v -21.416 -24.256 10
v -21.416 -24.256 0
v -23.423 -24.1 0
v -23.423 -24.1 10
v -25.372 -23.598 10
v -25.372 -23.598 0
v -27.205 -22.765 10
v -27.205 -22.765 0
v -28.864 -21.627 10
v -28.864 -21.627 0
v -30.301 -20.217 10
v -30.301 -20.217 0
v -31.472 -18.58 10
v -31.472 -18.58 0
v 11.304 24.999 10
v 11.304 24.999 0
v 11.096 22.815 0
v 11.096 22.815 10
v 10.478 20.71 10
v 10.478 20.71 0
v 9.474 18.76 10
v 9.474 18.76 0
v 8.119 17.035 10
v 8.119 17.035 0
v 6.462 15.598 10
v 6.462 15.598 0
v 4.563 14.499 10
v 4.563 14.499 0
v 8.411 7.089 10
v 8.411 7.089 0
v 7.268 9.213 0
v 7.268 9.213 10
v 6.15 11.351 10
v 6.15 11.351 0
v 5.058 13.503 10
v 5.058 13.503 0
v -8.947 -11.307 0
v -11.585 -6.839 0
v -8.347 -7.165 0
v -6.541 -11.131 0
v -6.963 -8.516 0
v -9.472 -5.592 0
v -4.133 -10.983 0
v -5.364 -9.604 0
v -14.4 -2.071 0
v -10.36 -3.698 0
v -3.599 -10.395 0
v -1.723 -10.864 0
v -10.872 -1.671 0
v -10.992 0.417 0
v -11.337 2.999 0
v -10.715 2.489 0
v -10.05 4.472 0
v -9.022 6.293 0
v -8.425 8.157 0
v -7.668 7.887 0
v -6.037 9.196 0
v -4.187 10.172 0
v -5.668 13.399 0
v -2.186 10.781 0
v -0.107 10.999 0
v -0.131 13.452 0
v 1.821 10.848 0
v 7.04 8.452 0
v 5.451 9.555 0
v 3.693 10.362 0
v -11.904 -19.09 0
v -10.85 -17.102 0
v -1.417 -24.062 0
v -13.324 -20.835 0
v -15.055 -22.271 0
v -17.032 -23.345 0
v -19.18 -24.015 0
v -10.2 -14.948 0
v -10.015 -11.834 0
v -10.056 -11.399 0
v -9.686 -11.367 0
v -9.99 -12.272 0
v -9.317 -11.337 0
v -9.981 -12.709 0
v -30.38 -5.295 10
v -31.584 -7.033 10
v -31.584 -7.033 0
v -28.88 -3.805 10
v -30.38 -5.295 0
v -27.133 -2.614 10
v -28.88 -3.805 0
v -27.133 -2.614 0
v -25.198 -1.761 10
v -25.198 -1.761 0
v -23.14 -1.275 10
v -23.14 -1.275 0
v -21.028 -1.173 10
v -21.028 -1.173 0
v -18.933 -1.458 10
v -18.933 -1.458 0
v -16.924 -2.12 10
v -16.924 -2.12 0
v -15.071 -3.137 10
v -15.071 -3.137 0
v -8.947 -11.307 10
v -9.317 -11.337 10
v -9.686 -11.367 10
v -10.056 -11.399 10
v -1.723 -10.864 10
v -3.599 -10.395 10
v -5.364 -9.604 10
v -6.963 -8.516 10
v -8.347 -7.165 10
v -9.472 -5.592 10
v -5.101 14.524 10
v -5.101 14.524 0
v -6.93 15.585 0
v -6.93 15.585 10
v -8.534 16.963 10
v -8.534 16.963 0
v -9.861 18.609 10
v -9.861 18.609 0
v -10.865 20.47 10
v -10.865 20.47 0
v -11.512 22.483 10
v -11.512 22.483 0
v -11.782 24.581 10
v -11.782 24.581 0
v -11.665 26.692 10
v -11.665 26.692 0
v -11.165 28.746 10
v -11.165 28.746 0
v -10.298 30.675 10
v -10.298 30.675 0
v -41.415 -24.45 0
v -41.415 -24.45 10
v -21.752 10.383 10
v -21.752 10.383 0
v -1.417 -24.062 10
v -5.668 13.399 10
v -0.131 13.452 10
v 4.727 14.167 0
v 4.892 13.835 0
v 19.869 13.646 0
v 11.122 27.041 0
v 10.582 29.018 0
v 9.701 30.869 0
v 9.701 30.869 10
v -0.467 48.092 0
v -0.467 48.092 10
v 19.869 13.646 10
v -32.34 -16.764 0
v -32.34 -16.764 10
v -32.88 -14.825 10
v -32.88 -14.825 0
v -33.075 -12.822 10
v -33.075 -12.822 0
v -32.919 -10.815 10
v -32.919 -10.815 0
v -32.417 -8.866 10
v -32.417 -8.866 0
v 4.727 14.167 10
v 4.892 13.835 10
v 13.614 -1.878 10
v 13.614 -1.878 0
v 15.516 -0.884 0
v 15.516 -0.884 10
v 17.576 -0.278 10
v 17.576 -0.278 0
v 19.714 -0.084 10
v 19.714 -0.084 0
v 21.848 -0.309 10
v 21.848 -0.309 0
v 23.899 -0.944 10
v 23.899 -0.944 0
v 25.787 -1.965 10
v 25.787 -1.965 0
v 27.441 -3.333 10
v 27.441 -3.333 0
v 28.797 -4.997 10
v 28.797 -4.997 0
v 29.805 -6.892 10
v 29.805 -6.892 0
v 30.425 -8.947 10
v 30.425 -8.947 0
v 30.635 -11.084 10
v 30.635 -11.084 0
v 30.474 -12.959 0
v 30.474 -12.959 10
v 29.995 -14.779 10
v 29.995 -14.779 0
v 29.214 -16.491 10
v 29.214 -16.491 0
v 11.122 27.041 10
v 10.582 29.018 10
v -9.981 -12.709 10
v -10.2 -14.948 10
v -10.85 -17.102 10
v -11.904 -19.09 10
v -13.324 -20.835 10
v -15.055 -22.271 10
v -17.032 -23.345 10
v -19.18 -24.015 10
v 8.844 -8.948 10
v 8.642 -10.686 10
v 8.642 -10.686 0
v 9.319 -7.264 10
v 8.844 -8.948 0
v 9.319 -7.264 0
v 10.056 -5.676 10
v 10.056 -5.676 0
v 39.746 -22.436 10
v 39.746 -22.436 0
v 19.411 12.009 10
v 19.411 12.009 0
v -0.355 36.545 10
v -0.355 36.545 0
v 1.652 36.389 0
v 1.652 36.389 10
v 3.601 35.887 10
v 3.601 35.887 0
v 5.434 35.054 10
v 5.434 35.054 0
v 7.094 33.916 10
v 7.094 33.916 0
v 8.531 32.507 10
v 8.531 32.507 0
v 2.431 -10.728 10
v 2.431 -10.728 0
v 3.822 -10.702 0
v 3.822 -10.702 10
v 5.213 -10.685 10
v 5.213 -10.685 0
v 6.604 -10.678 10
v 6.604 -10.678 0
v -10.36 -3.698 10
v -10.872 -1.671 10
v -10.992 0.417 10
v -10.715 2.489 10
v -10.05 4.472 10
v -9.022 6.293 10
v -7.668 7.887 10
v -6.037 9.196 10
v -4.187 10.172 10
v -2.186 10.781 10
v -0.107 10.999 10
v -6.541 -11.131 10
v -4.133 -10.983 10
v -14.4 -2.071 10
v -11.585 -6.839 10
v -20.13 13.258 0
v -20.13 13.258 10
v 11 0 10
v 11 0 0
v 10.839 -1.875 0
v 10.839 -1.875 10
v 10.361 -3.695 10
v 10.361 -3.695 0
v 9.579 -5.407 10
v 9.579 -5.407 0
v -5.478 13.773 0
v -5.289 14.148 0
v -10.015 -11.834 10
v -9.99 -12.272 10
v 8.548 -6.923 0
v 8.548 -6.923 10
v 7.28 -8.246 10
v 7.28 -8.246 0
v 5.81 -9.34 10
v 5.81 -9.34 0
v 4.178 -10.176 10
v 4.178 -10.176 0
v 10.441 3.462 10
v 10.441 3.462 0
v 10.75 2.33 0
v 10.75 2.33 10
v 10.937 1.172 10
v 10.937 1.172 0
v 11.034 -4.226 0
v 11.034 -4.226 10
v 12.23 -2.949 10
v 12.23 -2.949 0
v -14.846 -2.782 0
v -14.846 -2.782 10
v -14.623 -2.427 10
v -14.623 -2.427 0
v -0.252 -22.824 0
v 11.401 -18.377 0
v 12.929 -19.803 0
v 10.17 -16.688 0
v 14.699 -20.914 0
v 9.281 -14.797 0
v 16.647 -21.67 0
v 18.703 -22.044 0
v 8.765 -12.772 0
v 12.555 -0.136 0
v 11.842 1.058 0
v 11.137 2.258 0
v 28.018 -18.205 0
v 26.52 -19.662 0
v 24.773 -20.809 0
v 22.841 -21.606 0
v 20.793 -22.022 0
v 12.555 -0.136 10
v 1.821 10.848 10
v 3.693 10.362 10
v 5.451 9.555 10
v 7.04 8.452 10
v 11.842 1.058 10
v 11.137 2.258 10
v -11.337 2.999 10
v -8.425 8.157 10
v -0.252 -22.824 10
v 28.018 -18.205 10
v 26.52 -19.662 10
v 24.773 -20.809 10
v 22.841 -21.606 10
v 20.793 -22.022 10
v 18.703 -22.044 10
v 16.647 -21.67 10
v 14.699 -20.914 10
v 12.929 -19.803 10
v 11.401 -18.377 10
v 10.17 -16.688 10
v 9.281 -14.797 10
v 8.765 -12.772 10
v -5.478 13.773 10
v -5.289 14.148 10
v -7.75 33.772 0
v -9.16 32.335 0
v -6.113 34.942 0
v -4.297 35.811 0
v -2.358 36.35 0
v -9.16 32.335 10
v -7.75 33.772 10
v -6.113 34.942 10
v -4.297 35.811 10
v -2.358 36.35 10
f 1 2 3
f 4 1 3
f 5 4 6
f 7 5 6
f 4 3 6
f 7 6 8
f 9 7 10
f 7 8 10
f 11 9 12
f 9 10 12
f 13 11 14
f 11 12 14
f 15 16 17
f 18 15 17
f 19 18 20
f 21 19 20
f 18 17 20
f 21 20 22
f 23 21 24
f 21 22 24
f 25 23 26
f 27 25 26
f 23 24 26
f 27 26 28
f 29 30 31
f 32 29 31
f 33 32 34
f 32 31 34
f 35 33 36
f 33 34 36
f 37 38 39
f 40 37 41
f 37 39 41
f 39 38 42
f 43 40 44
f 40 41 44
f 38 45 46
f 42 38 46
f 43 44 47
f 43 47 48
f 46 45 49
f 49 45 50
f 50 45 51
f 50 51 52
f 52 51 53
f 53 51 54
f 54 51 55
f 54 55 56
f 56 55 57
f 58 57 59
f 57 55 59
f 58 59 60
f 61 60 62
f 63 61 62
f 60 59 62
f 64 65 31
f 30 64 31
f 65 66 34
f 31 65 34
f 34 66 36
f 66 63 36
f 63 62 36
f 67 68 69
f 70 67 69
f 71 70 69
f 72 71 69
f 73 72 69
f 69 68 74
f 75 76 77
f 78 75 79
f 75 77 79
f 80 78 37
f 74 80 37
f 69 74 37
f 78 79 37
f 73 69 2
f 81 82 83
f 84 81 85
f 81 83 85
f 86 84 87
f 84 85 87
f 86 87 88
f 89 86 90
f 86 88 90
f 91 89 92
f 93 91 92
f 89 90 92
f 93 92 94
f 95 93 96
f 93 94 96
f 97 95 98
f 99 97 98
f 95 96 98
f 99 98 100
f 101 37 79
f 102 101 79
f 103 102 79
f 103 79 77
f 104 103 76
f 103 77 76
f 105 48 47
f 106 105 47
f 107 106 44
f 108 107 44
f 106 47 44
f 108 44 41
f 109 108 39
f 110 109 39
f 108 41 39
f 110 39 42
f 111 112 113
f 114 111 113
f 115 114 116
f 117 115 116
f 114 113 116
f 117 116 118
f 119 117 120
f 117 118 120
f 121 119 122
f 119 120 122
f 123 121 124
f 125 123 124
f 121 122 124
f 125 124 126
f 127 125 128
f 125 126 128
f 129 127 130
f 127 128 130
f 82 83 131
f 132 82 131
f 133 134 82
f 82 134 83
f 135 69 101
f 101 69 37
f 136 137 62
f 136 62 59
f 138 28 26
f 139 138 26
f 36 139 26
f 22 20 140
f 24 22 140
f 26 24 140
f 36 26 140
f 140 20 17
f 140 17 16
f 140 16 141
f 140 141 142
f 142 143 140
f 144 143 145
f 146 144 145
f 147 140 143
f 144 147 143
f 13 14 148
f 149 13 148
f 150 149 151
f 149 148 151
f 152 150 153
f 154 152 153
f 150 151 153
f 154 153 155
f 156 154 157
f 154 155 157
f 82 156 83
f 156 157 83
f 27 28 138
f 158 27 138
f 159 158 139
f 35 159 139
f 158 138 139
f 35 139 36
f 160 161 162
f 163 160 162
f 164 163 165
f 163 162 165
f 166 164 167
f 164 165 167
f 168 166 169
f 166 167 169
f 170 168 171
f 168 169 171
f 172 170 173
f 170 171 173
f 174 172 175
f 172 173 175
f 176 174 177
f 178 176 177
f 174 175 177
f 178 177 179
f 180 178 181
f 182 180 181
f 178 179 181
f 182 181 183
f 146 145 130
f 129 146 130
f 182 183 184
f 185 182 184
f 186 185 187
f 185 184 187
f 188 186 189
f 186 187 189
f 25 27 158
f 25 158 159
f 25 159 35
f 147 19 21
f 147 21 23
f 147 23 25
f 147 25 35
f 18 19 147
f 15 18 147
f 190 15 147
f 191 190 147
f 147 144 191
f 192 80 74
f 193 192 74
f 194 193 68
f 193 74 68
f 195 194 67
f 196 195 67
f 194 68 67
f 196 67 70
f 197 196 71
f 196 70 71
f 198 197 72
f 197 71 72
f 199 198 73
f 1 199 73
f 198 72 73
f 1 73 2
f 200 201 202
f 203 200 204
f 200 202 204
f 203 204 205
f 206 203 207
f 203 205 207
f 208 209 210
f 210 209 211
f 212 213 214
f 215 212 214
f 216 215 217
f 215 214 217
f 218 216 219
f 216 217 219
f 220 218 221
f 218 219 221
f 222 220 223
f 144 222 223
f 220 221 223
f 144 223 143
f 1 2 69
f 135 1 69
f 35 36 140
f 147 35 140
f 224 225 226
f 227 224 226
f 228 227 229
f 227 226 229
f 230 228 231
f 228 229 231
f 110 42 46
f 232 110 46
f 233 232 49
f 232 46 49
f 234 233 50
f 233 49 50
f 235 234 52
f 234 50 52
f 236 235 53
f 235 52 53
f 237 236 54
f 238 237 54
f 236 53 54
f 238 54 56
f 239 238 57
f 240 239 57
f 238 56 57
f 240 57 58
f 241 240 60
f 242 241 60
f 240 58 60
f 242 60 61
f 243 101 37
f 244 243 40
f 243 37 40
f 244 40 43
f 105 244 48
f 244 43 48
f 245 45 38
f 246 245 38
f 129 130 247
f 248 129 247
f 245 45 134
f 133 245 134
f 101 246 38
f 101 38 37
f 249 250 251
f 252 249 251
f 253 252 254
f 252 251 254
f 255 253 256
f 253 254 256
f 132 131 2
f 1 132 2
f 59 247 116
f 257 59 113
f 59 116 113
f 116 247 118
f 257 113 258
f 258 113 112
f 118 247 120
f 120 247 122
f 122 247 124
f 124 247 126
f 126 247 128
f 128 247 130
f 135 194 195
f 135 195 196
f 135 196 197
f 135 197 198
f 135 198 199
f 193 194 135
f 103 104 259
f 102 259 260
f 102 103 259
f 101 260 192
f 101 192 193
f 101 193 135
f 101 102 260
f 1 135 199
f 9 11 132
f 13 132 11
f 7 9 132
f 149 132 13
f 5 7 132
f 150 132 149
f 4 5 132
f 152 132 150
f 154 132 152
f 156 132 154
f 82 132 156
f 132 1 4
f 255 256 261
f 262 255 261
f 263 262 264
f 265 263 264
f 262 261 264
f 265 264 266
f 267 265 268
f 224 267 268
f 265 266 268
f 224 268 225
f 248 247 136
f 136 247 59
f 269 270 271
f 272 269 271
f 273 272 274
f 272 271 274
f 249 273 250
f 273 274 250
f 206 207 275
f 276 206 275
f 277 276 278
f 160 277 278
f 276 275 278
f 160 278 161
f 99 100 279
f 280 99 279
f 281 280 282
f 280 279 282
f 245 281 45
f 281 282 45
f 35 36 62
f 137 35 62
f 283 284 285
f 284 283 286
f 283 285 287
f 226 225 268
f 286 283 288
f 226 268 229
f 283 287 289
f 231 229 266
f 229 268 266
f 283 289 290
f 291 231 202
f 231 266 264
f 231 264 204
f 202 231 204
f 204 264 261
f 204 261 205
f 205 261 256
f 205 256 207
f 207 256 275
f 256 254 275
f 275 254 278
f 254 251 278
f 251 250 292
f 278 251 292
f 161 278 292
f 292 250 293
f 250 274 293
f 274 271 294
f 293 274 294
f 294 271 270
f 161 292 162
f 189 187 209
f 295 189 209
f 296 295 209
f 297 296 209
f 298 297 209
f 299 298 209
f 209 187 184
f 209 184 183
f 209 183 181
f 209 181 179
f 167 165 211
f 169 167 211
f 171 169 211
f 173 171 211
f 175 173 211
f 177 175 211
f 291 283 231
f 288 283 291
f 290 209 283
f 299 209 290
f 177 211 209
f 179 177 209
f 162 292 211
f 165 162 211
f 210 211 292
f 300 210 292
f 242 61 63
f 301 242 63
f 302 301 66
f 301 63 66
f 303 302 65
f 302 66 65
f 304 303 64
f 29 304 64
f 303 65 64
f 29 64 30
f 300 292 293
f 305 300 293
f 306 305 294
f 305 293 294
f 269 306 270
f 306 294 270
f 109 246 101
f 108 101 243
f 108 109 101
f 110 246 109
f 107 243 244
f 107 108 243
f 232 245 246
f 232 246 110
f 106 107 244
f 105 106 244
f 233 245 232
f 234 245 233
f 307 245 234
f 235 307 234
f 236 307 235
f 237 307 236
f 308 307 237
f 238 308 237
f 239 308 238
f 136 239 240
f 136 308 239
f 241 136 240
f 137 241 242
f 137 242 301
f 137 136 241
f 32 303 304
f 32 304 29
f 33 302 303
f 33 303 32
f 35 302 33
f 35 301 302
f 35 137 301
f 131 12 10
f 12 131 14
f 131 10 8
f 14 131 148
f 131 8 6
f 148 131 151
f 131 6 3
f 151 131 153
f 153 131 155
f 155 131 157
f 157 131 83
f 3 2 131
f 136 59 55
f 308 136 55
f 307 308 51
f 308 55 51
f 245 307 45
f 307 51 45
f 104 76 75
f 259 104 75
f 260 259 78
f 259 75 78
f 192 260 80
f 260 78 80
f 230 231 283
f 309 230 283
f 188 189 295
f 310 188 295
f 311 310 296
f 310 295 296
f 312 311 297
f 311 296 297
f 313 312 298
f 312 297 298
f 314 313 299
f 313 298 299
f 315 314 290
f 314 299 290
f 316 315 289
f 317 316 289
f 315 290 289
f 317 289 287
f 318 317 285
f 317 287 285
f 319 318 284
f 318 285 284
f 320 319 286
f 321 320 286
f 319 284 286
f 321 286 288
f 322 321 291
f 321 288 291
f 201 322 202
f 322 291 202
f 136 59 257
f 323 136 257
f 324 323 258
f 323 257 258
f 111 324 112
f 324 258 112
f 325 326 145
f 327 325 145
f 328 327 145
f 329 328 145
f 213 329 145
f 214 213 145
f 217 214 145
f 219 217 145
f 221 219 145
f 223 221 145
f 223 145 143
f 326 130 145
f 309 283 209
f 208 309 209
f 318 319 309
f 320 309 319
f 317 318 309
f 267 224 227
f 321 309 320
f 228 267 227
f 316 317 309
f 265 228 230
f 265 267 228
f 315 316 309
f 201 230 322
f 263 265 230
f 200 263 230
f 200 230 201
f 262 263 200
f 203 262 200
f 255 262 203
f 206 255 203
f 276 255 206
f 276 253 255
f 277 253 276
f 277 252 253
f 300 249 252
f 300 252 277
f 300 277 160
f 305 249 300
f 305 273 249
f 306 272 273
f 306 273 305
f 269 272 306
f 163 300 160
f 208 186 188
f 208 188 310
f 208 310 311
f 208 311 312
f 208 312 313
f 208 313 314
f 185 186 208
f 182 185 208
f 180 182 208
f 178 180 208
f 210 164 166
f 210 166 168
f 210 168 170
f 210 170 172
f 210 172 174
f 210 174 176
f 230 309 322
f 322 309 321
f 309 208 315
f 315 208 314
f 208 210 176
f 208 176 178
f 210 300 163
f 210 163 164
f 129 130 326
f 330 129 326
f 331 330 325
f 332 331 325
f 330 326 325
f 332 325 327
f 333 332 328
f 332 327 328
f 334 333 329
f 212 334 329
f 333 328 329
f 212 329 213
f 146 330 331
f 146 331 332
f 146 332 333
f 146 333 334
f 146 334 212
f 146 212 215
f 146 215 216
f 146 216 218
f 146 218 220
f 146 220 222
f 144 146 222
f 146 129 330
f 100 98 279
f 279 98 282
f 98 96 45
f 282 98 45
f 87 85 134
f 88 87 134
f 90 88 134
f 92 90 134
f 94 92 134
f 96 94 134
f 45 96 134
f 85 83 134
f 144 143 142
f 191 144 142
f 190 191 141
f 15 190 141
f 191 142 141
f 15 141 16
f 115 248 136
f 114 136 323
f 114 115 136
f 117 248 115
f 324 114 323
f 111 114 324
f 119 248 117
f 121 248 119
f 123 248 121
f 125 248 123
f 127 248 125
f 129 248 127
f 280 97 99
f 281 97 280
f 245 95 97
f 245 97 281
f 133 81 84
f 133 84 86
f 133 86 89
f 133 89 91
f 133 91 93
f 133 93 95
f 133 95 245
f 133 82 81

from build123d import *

# Parameters (mm, degrees)
F1_DEPTH = 10


with BuildPart() as f1:
    # F0 (on Top) → F1 (new body)
    with BuildSketch(Plane.XY):
        with BuildLine():
            ThreePointArc((-9.4724629741, -5.5921771434), (-9.5791989557, 5.4073050003), (-0.1067359816, 10.9994821437))
            Line((-0.1067359816, 10.9994821437), (-0.1305380532, 13.4523612782))
            Line((-0.1305380315, 13.4523612785), (-5.6676372798, 13.3986307741))
            ThreePointArc((-5.6676372798, 13.3986307741), (-9.8619346797, 5.5669048062), (-14.3998991761, -2.070826568))
            Line((-14.3998991761, -2.070826568), (-11.5848176191, -6.8392298452))
            Line((-11.5848175812, -6.8392299094), (-9.4724629741, -5.5921771434))
        make_face()
        with BuildLine():
            Line((-0.1305380532, 13.4523612782), (-0.1067359816, 10.9994821437))
            ThreePointArc((-0.1067359816, 10.9994821437), (4.5895542781, 9.9967990641), (8.4111545556, 7.0888982954))
            ThreePointArc((8.4111545556, 7.0888982954), (6.7054289822, 10.2806322034), (5.0577336181, 13.5027068547))
            Line((5.0577336181, 13.5027068547), (-0.1305380315, 13.4523612785))
        make_face()
        with BuildLine():
            ThreePointArc((-1.7230864536, -10.8642060489), (-6.1873786002, -9.0948527233), (-9.4724629741, -5.5921771434))
            Line((-9.4724629741, -5.5921771434), (-11.5848175812, -6.8392299094))
            Line((-11.5848176191, -6.8392298452), (-8.9470811973, -11.3072321903))
            ThreePointArc((-8.9470811973, -11.3072321903), (-5.3370880091, -11.0530388546), (-1.7230864536, -10.8642060489))
        make_face()
    extrude(amount=F1_DEPTH)


with BuildPart() as f1b:
    # F0 (on Top) → F1, piece 2 (new body)
    with BuildSketch(Plane.XY):
        with BuildLine():
            Line((12.5545481824, -0.1363868252), (9.5791989174, -5.4073050681))
            Line((9.5791989557, -5.4073050003), (10.0555510831, -5.6761981773))
            ThreePointArc((10.0555510831, -5.6761981773), (11.606819874, -3.563374371), (13.6139198008, -1.8775484067))
            ThreePointArc((13.6139198008, -1.8775484067), (13.0820160477, -1.0083170753), (12.5545481824, -0.1363868252))
        make_face()
        with BuildLine():
            Line((6.6038497291, -10.6782231755), (9.5791989174, -5.4073050681))
            ThreePointArc((9.5791989174, -5.4073050681), (6.5679269383, -8.8239637201), (2.4308083201, -10.7280553182))
            ThreePointArc((2.4308083201, -10.7280553182), (4.517199042, -10.692254253), (6.6038497291, -10.6782231755))
        make_face()
        with BuildLine():
            Line((10.0555510831, -5.6761981773), (9.5791989557, -5.4073050003))
            Line((9.5791989174, -5.4073050681), (6.6038497291, -10.6782231755))
            ThreePointArc((6.6038497291, -10.6782231755), (7.6229098775, -10.6792833185), (8.6419513958, -10.6855358516))
            ThreePointArc((8.6419513958, -10.6855358516), (9.0481954867, -8.0960523053), (10.0555510831, -5.6761981773))
        make_face()
        with BuildLine():
            ThreePointArc((11, 0), (10.6388718408, -2.7954258985), (9.5791989174, -5.4073050681))
            Line((9.5791989174, -5.4073050681), (12.5545481824, -0.1363868252))
            ThreePointArc((12.5545481824, -0.1363868252), (11.4883643789, 1.6573690273), (10.4409534845, 3.4621511137))
            ThreePointArc((10.4409534845, 3.4621511137), (10.8593390298, 1.7534981708), (11, 0))
        make_face()
        with BuildLine():
            ThreePointArc((8.6419513958, -10.6855358516), (7.6229098775, -10.6792833185), (6.6038497291, -10.6782231755))
            Line((6.6038497291, -10.6782231755), (-0.2522646812, -22.8240303744))
            Line((-0.2522646812, -22.8240303744), (39.7458522051, -22.4358995322))
            Line((39.7458522051, -22.4358995322), (19.4106625927, 12.0094203738))
            Line((19.4106625927, 12.0094203738), (12.5545481824, -0.1363868252))
            ThreePointArc((12.5545481824, -0.1363868252), (13.0820160477, -1.0083170753), (13.6139198008, -1.8775484067))
            ThreePointArc((13.6139198008, -1.8775484067), (24.8678594101, -1.4080411055), (30.6347500389, -11.0835031776))
            ThreePointArc((30.6347500389, -11.0835031776), (30.2736218896, -13.8789290385), (29.2139489946, -16.4908081779))
            ThreePointArc((29.2139489946, -16.4908081779), (16.6472991665, -21.6700577298), (8.6419513958, -10.6855358516))
        make_face()
    extrude(amount=F1_DEPTH)


with BuildPart() as f1c:
    # F0 (on Top) → F1, piece 3 (new body)
    with BuildSketch(Plane.XY):
        with BuildLine():
            ThreePointArc((-5.6676372798, 13.3986307741), (-5.3835781261, 13.9607653638), (-5.1012906228, 14.5237917089))
            ThreePointArc((-5.1012906228, 14.5237917089), (-11.2345943606, 21.4620176196), (-10.2981329222, 30.6750211202))
            Line((-10.2981329222, 30.6750211202), (-20.1295964964, 13.2582958572))
            Line((-20.1295964964, 13.2582958572), (-5.6676372798, 13.3986307741))
        make_face()
    extrude(amount=F1_DEPTH)


with BuildPart() as f1d:
    # F0 (on Top) → F1, piece 4 (new body)
    with BuildSketch(Plane.XY):
        with BuildLine():
            ThreePointArc((11.3044236075, 24.9988230539), (9.473956651, 18.7600560024), (4.5628983325, 14.4992661939))
            ThreePointArc((4.5628983325, 14.4992661939), (4.8096229597, 14.0006424117), (5.0577336181, 13.5027068547))
            Line((5.0577336181, 13.5027068547), (19.8685203899, 13.6464266993))
            Line((19.8685203899, 13.6464266993), (9.7009257177, 30.8690864252))
            ThreePointArc((9.7009257177, 30.8690864252), (10.8963380075, 28.0414862595), (11.3044236075, 24.9988230539))
        make_face()
    extrude(amount=F1_DEPTH)


with BuildPart() as f1e:
    # F0 (on Top) → F1, piece 5 (new body)
    with BuildSketch(Plane.XY):
        with BuildLine():
            ThreePointArc((-8.9470811973, -11.3072321903), (-9.501595119, -11.3520989755), (-10.0559820928, -11.3985080385))
            ThreePointArc((-10.0559820928, -11.3985080385), (-10.0000003021, -12.0529385986), (-9.9813195575, -12.7094935078))
            ThreePointArc((-9.9813195575, -12.7094935078), (-13.3238411908, -20.8347491789), (-21.4162808358, -24.2559552797))
            Line((-21.4162808358, -24.2559552797), (-1.417222775, -24.0618898624))
            Line((-1.417222775, -24.0618898624), (-8.9470811973, -11.3072321903))
        make_face()
    extrude(amount=F1_DEPTH)


with BuildPart() as f1f:
    # F0 (on Top) → F1, piece 6 (new body)
    with BuildSketch(Plane.XY):
        with BuildLine():
            ThreePointArc((-31.5838762413, -7.0332957148), (-24.1799561682, -1.471069011), (-15.0705785167, -3.1370933673))
            ThreePointArc((-15.0705785167, -3.1370933673), (-14.7343993878, -2.6044879851), (-14.3998991761, -2.070826568))
            Line((-14.3998991761, -2.070826568), (-21.7524123874, 10.3834300436))
            Line((-21.7524123874, 10.3834300436), (-31.5838762413, -7.0332957148))
        make_face()
    extrude(amount=F1_DEPTH)


with BuildPart() as f1g:
    # F0 (on Top) → F1, piece 7 (new body)
    with BuildSketch(Plane.XY):
        with BuildLine():
            ThreePointArc((-10.2981329222, 30.6750211202), (-6.1128454296, 34.9423303815), (-0.3546254994, 36.5452848296))
            Line((-0.3546254994, 36.5452848296), (-0.4666692225, 48.0917466053))
            Line((-0.4666692225, 48.0917466053), (-10.2981329222, 30.6750211202))
        make_face()
        with BuildLine():
            Line((-0.4666692225, 48.0917466053), (-0.3546254994, 36.5452848296))
            ThreePointArc((-0.3546254994, 36.5452848296), (5.4336165158, 35.0543740722), (9.7009257177, 30.8690864252))
            Line((9.7009257177, 30.8690864252), (-0.4666692225, 48.0917466053))
        make_face()
    extrude(amount=F1_DEPTH)


with BuildPart() as f1h:
    # F0 (on Top) → F1, piece 8 (new body)
    with BuildSketch(Plane.XY):
        with BuildLine():
            ThreePointArc((-21.4162808358, -24.2559552797), (-27.204522952, -22.7650446849), (-31.4718323013, -18.5797571062))
            Line((-31.4718323013, -18.5797571062), (-41.4153396613, -24.4500207045))
            Line((-41.4153396613, -24.4500207045), (-21.4162808358, -24.2559552797))
        make_face()
        with BuildLine():
            Line((-41.4153396613, -24.4500207045), (-31.4718323013, -18.5797571062))
            ThreePointArc((-31.4718323013, -18.5797571062), (-33.0747867148, -12.8215374515), (-31.5838762413, -7.0332957148))
            Line((-31.5838762413, -7.0332957148), (-41.4153396613, -24.4500207045))
        make_face()
    extrude(amount=F1_DEPTH)


solid = Compound([f1.part, f1b.part, f1c.part, f1d.part, f1e.part, f1f.part, f1g.part, f1h.part])
